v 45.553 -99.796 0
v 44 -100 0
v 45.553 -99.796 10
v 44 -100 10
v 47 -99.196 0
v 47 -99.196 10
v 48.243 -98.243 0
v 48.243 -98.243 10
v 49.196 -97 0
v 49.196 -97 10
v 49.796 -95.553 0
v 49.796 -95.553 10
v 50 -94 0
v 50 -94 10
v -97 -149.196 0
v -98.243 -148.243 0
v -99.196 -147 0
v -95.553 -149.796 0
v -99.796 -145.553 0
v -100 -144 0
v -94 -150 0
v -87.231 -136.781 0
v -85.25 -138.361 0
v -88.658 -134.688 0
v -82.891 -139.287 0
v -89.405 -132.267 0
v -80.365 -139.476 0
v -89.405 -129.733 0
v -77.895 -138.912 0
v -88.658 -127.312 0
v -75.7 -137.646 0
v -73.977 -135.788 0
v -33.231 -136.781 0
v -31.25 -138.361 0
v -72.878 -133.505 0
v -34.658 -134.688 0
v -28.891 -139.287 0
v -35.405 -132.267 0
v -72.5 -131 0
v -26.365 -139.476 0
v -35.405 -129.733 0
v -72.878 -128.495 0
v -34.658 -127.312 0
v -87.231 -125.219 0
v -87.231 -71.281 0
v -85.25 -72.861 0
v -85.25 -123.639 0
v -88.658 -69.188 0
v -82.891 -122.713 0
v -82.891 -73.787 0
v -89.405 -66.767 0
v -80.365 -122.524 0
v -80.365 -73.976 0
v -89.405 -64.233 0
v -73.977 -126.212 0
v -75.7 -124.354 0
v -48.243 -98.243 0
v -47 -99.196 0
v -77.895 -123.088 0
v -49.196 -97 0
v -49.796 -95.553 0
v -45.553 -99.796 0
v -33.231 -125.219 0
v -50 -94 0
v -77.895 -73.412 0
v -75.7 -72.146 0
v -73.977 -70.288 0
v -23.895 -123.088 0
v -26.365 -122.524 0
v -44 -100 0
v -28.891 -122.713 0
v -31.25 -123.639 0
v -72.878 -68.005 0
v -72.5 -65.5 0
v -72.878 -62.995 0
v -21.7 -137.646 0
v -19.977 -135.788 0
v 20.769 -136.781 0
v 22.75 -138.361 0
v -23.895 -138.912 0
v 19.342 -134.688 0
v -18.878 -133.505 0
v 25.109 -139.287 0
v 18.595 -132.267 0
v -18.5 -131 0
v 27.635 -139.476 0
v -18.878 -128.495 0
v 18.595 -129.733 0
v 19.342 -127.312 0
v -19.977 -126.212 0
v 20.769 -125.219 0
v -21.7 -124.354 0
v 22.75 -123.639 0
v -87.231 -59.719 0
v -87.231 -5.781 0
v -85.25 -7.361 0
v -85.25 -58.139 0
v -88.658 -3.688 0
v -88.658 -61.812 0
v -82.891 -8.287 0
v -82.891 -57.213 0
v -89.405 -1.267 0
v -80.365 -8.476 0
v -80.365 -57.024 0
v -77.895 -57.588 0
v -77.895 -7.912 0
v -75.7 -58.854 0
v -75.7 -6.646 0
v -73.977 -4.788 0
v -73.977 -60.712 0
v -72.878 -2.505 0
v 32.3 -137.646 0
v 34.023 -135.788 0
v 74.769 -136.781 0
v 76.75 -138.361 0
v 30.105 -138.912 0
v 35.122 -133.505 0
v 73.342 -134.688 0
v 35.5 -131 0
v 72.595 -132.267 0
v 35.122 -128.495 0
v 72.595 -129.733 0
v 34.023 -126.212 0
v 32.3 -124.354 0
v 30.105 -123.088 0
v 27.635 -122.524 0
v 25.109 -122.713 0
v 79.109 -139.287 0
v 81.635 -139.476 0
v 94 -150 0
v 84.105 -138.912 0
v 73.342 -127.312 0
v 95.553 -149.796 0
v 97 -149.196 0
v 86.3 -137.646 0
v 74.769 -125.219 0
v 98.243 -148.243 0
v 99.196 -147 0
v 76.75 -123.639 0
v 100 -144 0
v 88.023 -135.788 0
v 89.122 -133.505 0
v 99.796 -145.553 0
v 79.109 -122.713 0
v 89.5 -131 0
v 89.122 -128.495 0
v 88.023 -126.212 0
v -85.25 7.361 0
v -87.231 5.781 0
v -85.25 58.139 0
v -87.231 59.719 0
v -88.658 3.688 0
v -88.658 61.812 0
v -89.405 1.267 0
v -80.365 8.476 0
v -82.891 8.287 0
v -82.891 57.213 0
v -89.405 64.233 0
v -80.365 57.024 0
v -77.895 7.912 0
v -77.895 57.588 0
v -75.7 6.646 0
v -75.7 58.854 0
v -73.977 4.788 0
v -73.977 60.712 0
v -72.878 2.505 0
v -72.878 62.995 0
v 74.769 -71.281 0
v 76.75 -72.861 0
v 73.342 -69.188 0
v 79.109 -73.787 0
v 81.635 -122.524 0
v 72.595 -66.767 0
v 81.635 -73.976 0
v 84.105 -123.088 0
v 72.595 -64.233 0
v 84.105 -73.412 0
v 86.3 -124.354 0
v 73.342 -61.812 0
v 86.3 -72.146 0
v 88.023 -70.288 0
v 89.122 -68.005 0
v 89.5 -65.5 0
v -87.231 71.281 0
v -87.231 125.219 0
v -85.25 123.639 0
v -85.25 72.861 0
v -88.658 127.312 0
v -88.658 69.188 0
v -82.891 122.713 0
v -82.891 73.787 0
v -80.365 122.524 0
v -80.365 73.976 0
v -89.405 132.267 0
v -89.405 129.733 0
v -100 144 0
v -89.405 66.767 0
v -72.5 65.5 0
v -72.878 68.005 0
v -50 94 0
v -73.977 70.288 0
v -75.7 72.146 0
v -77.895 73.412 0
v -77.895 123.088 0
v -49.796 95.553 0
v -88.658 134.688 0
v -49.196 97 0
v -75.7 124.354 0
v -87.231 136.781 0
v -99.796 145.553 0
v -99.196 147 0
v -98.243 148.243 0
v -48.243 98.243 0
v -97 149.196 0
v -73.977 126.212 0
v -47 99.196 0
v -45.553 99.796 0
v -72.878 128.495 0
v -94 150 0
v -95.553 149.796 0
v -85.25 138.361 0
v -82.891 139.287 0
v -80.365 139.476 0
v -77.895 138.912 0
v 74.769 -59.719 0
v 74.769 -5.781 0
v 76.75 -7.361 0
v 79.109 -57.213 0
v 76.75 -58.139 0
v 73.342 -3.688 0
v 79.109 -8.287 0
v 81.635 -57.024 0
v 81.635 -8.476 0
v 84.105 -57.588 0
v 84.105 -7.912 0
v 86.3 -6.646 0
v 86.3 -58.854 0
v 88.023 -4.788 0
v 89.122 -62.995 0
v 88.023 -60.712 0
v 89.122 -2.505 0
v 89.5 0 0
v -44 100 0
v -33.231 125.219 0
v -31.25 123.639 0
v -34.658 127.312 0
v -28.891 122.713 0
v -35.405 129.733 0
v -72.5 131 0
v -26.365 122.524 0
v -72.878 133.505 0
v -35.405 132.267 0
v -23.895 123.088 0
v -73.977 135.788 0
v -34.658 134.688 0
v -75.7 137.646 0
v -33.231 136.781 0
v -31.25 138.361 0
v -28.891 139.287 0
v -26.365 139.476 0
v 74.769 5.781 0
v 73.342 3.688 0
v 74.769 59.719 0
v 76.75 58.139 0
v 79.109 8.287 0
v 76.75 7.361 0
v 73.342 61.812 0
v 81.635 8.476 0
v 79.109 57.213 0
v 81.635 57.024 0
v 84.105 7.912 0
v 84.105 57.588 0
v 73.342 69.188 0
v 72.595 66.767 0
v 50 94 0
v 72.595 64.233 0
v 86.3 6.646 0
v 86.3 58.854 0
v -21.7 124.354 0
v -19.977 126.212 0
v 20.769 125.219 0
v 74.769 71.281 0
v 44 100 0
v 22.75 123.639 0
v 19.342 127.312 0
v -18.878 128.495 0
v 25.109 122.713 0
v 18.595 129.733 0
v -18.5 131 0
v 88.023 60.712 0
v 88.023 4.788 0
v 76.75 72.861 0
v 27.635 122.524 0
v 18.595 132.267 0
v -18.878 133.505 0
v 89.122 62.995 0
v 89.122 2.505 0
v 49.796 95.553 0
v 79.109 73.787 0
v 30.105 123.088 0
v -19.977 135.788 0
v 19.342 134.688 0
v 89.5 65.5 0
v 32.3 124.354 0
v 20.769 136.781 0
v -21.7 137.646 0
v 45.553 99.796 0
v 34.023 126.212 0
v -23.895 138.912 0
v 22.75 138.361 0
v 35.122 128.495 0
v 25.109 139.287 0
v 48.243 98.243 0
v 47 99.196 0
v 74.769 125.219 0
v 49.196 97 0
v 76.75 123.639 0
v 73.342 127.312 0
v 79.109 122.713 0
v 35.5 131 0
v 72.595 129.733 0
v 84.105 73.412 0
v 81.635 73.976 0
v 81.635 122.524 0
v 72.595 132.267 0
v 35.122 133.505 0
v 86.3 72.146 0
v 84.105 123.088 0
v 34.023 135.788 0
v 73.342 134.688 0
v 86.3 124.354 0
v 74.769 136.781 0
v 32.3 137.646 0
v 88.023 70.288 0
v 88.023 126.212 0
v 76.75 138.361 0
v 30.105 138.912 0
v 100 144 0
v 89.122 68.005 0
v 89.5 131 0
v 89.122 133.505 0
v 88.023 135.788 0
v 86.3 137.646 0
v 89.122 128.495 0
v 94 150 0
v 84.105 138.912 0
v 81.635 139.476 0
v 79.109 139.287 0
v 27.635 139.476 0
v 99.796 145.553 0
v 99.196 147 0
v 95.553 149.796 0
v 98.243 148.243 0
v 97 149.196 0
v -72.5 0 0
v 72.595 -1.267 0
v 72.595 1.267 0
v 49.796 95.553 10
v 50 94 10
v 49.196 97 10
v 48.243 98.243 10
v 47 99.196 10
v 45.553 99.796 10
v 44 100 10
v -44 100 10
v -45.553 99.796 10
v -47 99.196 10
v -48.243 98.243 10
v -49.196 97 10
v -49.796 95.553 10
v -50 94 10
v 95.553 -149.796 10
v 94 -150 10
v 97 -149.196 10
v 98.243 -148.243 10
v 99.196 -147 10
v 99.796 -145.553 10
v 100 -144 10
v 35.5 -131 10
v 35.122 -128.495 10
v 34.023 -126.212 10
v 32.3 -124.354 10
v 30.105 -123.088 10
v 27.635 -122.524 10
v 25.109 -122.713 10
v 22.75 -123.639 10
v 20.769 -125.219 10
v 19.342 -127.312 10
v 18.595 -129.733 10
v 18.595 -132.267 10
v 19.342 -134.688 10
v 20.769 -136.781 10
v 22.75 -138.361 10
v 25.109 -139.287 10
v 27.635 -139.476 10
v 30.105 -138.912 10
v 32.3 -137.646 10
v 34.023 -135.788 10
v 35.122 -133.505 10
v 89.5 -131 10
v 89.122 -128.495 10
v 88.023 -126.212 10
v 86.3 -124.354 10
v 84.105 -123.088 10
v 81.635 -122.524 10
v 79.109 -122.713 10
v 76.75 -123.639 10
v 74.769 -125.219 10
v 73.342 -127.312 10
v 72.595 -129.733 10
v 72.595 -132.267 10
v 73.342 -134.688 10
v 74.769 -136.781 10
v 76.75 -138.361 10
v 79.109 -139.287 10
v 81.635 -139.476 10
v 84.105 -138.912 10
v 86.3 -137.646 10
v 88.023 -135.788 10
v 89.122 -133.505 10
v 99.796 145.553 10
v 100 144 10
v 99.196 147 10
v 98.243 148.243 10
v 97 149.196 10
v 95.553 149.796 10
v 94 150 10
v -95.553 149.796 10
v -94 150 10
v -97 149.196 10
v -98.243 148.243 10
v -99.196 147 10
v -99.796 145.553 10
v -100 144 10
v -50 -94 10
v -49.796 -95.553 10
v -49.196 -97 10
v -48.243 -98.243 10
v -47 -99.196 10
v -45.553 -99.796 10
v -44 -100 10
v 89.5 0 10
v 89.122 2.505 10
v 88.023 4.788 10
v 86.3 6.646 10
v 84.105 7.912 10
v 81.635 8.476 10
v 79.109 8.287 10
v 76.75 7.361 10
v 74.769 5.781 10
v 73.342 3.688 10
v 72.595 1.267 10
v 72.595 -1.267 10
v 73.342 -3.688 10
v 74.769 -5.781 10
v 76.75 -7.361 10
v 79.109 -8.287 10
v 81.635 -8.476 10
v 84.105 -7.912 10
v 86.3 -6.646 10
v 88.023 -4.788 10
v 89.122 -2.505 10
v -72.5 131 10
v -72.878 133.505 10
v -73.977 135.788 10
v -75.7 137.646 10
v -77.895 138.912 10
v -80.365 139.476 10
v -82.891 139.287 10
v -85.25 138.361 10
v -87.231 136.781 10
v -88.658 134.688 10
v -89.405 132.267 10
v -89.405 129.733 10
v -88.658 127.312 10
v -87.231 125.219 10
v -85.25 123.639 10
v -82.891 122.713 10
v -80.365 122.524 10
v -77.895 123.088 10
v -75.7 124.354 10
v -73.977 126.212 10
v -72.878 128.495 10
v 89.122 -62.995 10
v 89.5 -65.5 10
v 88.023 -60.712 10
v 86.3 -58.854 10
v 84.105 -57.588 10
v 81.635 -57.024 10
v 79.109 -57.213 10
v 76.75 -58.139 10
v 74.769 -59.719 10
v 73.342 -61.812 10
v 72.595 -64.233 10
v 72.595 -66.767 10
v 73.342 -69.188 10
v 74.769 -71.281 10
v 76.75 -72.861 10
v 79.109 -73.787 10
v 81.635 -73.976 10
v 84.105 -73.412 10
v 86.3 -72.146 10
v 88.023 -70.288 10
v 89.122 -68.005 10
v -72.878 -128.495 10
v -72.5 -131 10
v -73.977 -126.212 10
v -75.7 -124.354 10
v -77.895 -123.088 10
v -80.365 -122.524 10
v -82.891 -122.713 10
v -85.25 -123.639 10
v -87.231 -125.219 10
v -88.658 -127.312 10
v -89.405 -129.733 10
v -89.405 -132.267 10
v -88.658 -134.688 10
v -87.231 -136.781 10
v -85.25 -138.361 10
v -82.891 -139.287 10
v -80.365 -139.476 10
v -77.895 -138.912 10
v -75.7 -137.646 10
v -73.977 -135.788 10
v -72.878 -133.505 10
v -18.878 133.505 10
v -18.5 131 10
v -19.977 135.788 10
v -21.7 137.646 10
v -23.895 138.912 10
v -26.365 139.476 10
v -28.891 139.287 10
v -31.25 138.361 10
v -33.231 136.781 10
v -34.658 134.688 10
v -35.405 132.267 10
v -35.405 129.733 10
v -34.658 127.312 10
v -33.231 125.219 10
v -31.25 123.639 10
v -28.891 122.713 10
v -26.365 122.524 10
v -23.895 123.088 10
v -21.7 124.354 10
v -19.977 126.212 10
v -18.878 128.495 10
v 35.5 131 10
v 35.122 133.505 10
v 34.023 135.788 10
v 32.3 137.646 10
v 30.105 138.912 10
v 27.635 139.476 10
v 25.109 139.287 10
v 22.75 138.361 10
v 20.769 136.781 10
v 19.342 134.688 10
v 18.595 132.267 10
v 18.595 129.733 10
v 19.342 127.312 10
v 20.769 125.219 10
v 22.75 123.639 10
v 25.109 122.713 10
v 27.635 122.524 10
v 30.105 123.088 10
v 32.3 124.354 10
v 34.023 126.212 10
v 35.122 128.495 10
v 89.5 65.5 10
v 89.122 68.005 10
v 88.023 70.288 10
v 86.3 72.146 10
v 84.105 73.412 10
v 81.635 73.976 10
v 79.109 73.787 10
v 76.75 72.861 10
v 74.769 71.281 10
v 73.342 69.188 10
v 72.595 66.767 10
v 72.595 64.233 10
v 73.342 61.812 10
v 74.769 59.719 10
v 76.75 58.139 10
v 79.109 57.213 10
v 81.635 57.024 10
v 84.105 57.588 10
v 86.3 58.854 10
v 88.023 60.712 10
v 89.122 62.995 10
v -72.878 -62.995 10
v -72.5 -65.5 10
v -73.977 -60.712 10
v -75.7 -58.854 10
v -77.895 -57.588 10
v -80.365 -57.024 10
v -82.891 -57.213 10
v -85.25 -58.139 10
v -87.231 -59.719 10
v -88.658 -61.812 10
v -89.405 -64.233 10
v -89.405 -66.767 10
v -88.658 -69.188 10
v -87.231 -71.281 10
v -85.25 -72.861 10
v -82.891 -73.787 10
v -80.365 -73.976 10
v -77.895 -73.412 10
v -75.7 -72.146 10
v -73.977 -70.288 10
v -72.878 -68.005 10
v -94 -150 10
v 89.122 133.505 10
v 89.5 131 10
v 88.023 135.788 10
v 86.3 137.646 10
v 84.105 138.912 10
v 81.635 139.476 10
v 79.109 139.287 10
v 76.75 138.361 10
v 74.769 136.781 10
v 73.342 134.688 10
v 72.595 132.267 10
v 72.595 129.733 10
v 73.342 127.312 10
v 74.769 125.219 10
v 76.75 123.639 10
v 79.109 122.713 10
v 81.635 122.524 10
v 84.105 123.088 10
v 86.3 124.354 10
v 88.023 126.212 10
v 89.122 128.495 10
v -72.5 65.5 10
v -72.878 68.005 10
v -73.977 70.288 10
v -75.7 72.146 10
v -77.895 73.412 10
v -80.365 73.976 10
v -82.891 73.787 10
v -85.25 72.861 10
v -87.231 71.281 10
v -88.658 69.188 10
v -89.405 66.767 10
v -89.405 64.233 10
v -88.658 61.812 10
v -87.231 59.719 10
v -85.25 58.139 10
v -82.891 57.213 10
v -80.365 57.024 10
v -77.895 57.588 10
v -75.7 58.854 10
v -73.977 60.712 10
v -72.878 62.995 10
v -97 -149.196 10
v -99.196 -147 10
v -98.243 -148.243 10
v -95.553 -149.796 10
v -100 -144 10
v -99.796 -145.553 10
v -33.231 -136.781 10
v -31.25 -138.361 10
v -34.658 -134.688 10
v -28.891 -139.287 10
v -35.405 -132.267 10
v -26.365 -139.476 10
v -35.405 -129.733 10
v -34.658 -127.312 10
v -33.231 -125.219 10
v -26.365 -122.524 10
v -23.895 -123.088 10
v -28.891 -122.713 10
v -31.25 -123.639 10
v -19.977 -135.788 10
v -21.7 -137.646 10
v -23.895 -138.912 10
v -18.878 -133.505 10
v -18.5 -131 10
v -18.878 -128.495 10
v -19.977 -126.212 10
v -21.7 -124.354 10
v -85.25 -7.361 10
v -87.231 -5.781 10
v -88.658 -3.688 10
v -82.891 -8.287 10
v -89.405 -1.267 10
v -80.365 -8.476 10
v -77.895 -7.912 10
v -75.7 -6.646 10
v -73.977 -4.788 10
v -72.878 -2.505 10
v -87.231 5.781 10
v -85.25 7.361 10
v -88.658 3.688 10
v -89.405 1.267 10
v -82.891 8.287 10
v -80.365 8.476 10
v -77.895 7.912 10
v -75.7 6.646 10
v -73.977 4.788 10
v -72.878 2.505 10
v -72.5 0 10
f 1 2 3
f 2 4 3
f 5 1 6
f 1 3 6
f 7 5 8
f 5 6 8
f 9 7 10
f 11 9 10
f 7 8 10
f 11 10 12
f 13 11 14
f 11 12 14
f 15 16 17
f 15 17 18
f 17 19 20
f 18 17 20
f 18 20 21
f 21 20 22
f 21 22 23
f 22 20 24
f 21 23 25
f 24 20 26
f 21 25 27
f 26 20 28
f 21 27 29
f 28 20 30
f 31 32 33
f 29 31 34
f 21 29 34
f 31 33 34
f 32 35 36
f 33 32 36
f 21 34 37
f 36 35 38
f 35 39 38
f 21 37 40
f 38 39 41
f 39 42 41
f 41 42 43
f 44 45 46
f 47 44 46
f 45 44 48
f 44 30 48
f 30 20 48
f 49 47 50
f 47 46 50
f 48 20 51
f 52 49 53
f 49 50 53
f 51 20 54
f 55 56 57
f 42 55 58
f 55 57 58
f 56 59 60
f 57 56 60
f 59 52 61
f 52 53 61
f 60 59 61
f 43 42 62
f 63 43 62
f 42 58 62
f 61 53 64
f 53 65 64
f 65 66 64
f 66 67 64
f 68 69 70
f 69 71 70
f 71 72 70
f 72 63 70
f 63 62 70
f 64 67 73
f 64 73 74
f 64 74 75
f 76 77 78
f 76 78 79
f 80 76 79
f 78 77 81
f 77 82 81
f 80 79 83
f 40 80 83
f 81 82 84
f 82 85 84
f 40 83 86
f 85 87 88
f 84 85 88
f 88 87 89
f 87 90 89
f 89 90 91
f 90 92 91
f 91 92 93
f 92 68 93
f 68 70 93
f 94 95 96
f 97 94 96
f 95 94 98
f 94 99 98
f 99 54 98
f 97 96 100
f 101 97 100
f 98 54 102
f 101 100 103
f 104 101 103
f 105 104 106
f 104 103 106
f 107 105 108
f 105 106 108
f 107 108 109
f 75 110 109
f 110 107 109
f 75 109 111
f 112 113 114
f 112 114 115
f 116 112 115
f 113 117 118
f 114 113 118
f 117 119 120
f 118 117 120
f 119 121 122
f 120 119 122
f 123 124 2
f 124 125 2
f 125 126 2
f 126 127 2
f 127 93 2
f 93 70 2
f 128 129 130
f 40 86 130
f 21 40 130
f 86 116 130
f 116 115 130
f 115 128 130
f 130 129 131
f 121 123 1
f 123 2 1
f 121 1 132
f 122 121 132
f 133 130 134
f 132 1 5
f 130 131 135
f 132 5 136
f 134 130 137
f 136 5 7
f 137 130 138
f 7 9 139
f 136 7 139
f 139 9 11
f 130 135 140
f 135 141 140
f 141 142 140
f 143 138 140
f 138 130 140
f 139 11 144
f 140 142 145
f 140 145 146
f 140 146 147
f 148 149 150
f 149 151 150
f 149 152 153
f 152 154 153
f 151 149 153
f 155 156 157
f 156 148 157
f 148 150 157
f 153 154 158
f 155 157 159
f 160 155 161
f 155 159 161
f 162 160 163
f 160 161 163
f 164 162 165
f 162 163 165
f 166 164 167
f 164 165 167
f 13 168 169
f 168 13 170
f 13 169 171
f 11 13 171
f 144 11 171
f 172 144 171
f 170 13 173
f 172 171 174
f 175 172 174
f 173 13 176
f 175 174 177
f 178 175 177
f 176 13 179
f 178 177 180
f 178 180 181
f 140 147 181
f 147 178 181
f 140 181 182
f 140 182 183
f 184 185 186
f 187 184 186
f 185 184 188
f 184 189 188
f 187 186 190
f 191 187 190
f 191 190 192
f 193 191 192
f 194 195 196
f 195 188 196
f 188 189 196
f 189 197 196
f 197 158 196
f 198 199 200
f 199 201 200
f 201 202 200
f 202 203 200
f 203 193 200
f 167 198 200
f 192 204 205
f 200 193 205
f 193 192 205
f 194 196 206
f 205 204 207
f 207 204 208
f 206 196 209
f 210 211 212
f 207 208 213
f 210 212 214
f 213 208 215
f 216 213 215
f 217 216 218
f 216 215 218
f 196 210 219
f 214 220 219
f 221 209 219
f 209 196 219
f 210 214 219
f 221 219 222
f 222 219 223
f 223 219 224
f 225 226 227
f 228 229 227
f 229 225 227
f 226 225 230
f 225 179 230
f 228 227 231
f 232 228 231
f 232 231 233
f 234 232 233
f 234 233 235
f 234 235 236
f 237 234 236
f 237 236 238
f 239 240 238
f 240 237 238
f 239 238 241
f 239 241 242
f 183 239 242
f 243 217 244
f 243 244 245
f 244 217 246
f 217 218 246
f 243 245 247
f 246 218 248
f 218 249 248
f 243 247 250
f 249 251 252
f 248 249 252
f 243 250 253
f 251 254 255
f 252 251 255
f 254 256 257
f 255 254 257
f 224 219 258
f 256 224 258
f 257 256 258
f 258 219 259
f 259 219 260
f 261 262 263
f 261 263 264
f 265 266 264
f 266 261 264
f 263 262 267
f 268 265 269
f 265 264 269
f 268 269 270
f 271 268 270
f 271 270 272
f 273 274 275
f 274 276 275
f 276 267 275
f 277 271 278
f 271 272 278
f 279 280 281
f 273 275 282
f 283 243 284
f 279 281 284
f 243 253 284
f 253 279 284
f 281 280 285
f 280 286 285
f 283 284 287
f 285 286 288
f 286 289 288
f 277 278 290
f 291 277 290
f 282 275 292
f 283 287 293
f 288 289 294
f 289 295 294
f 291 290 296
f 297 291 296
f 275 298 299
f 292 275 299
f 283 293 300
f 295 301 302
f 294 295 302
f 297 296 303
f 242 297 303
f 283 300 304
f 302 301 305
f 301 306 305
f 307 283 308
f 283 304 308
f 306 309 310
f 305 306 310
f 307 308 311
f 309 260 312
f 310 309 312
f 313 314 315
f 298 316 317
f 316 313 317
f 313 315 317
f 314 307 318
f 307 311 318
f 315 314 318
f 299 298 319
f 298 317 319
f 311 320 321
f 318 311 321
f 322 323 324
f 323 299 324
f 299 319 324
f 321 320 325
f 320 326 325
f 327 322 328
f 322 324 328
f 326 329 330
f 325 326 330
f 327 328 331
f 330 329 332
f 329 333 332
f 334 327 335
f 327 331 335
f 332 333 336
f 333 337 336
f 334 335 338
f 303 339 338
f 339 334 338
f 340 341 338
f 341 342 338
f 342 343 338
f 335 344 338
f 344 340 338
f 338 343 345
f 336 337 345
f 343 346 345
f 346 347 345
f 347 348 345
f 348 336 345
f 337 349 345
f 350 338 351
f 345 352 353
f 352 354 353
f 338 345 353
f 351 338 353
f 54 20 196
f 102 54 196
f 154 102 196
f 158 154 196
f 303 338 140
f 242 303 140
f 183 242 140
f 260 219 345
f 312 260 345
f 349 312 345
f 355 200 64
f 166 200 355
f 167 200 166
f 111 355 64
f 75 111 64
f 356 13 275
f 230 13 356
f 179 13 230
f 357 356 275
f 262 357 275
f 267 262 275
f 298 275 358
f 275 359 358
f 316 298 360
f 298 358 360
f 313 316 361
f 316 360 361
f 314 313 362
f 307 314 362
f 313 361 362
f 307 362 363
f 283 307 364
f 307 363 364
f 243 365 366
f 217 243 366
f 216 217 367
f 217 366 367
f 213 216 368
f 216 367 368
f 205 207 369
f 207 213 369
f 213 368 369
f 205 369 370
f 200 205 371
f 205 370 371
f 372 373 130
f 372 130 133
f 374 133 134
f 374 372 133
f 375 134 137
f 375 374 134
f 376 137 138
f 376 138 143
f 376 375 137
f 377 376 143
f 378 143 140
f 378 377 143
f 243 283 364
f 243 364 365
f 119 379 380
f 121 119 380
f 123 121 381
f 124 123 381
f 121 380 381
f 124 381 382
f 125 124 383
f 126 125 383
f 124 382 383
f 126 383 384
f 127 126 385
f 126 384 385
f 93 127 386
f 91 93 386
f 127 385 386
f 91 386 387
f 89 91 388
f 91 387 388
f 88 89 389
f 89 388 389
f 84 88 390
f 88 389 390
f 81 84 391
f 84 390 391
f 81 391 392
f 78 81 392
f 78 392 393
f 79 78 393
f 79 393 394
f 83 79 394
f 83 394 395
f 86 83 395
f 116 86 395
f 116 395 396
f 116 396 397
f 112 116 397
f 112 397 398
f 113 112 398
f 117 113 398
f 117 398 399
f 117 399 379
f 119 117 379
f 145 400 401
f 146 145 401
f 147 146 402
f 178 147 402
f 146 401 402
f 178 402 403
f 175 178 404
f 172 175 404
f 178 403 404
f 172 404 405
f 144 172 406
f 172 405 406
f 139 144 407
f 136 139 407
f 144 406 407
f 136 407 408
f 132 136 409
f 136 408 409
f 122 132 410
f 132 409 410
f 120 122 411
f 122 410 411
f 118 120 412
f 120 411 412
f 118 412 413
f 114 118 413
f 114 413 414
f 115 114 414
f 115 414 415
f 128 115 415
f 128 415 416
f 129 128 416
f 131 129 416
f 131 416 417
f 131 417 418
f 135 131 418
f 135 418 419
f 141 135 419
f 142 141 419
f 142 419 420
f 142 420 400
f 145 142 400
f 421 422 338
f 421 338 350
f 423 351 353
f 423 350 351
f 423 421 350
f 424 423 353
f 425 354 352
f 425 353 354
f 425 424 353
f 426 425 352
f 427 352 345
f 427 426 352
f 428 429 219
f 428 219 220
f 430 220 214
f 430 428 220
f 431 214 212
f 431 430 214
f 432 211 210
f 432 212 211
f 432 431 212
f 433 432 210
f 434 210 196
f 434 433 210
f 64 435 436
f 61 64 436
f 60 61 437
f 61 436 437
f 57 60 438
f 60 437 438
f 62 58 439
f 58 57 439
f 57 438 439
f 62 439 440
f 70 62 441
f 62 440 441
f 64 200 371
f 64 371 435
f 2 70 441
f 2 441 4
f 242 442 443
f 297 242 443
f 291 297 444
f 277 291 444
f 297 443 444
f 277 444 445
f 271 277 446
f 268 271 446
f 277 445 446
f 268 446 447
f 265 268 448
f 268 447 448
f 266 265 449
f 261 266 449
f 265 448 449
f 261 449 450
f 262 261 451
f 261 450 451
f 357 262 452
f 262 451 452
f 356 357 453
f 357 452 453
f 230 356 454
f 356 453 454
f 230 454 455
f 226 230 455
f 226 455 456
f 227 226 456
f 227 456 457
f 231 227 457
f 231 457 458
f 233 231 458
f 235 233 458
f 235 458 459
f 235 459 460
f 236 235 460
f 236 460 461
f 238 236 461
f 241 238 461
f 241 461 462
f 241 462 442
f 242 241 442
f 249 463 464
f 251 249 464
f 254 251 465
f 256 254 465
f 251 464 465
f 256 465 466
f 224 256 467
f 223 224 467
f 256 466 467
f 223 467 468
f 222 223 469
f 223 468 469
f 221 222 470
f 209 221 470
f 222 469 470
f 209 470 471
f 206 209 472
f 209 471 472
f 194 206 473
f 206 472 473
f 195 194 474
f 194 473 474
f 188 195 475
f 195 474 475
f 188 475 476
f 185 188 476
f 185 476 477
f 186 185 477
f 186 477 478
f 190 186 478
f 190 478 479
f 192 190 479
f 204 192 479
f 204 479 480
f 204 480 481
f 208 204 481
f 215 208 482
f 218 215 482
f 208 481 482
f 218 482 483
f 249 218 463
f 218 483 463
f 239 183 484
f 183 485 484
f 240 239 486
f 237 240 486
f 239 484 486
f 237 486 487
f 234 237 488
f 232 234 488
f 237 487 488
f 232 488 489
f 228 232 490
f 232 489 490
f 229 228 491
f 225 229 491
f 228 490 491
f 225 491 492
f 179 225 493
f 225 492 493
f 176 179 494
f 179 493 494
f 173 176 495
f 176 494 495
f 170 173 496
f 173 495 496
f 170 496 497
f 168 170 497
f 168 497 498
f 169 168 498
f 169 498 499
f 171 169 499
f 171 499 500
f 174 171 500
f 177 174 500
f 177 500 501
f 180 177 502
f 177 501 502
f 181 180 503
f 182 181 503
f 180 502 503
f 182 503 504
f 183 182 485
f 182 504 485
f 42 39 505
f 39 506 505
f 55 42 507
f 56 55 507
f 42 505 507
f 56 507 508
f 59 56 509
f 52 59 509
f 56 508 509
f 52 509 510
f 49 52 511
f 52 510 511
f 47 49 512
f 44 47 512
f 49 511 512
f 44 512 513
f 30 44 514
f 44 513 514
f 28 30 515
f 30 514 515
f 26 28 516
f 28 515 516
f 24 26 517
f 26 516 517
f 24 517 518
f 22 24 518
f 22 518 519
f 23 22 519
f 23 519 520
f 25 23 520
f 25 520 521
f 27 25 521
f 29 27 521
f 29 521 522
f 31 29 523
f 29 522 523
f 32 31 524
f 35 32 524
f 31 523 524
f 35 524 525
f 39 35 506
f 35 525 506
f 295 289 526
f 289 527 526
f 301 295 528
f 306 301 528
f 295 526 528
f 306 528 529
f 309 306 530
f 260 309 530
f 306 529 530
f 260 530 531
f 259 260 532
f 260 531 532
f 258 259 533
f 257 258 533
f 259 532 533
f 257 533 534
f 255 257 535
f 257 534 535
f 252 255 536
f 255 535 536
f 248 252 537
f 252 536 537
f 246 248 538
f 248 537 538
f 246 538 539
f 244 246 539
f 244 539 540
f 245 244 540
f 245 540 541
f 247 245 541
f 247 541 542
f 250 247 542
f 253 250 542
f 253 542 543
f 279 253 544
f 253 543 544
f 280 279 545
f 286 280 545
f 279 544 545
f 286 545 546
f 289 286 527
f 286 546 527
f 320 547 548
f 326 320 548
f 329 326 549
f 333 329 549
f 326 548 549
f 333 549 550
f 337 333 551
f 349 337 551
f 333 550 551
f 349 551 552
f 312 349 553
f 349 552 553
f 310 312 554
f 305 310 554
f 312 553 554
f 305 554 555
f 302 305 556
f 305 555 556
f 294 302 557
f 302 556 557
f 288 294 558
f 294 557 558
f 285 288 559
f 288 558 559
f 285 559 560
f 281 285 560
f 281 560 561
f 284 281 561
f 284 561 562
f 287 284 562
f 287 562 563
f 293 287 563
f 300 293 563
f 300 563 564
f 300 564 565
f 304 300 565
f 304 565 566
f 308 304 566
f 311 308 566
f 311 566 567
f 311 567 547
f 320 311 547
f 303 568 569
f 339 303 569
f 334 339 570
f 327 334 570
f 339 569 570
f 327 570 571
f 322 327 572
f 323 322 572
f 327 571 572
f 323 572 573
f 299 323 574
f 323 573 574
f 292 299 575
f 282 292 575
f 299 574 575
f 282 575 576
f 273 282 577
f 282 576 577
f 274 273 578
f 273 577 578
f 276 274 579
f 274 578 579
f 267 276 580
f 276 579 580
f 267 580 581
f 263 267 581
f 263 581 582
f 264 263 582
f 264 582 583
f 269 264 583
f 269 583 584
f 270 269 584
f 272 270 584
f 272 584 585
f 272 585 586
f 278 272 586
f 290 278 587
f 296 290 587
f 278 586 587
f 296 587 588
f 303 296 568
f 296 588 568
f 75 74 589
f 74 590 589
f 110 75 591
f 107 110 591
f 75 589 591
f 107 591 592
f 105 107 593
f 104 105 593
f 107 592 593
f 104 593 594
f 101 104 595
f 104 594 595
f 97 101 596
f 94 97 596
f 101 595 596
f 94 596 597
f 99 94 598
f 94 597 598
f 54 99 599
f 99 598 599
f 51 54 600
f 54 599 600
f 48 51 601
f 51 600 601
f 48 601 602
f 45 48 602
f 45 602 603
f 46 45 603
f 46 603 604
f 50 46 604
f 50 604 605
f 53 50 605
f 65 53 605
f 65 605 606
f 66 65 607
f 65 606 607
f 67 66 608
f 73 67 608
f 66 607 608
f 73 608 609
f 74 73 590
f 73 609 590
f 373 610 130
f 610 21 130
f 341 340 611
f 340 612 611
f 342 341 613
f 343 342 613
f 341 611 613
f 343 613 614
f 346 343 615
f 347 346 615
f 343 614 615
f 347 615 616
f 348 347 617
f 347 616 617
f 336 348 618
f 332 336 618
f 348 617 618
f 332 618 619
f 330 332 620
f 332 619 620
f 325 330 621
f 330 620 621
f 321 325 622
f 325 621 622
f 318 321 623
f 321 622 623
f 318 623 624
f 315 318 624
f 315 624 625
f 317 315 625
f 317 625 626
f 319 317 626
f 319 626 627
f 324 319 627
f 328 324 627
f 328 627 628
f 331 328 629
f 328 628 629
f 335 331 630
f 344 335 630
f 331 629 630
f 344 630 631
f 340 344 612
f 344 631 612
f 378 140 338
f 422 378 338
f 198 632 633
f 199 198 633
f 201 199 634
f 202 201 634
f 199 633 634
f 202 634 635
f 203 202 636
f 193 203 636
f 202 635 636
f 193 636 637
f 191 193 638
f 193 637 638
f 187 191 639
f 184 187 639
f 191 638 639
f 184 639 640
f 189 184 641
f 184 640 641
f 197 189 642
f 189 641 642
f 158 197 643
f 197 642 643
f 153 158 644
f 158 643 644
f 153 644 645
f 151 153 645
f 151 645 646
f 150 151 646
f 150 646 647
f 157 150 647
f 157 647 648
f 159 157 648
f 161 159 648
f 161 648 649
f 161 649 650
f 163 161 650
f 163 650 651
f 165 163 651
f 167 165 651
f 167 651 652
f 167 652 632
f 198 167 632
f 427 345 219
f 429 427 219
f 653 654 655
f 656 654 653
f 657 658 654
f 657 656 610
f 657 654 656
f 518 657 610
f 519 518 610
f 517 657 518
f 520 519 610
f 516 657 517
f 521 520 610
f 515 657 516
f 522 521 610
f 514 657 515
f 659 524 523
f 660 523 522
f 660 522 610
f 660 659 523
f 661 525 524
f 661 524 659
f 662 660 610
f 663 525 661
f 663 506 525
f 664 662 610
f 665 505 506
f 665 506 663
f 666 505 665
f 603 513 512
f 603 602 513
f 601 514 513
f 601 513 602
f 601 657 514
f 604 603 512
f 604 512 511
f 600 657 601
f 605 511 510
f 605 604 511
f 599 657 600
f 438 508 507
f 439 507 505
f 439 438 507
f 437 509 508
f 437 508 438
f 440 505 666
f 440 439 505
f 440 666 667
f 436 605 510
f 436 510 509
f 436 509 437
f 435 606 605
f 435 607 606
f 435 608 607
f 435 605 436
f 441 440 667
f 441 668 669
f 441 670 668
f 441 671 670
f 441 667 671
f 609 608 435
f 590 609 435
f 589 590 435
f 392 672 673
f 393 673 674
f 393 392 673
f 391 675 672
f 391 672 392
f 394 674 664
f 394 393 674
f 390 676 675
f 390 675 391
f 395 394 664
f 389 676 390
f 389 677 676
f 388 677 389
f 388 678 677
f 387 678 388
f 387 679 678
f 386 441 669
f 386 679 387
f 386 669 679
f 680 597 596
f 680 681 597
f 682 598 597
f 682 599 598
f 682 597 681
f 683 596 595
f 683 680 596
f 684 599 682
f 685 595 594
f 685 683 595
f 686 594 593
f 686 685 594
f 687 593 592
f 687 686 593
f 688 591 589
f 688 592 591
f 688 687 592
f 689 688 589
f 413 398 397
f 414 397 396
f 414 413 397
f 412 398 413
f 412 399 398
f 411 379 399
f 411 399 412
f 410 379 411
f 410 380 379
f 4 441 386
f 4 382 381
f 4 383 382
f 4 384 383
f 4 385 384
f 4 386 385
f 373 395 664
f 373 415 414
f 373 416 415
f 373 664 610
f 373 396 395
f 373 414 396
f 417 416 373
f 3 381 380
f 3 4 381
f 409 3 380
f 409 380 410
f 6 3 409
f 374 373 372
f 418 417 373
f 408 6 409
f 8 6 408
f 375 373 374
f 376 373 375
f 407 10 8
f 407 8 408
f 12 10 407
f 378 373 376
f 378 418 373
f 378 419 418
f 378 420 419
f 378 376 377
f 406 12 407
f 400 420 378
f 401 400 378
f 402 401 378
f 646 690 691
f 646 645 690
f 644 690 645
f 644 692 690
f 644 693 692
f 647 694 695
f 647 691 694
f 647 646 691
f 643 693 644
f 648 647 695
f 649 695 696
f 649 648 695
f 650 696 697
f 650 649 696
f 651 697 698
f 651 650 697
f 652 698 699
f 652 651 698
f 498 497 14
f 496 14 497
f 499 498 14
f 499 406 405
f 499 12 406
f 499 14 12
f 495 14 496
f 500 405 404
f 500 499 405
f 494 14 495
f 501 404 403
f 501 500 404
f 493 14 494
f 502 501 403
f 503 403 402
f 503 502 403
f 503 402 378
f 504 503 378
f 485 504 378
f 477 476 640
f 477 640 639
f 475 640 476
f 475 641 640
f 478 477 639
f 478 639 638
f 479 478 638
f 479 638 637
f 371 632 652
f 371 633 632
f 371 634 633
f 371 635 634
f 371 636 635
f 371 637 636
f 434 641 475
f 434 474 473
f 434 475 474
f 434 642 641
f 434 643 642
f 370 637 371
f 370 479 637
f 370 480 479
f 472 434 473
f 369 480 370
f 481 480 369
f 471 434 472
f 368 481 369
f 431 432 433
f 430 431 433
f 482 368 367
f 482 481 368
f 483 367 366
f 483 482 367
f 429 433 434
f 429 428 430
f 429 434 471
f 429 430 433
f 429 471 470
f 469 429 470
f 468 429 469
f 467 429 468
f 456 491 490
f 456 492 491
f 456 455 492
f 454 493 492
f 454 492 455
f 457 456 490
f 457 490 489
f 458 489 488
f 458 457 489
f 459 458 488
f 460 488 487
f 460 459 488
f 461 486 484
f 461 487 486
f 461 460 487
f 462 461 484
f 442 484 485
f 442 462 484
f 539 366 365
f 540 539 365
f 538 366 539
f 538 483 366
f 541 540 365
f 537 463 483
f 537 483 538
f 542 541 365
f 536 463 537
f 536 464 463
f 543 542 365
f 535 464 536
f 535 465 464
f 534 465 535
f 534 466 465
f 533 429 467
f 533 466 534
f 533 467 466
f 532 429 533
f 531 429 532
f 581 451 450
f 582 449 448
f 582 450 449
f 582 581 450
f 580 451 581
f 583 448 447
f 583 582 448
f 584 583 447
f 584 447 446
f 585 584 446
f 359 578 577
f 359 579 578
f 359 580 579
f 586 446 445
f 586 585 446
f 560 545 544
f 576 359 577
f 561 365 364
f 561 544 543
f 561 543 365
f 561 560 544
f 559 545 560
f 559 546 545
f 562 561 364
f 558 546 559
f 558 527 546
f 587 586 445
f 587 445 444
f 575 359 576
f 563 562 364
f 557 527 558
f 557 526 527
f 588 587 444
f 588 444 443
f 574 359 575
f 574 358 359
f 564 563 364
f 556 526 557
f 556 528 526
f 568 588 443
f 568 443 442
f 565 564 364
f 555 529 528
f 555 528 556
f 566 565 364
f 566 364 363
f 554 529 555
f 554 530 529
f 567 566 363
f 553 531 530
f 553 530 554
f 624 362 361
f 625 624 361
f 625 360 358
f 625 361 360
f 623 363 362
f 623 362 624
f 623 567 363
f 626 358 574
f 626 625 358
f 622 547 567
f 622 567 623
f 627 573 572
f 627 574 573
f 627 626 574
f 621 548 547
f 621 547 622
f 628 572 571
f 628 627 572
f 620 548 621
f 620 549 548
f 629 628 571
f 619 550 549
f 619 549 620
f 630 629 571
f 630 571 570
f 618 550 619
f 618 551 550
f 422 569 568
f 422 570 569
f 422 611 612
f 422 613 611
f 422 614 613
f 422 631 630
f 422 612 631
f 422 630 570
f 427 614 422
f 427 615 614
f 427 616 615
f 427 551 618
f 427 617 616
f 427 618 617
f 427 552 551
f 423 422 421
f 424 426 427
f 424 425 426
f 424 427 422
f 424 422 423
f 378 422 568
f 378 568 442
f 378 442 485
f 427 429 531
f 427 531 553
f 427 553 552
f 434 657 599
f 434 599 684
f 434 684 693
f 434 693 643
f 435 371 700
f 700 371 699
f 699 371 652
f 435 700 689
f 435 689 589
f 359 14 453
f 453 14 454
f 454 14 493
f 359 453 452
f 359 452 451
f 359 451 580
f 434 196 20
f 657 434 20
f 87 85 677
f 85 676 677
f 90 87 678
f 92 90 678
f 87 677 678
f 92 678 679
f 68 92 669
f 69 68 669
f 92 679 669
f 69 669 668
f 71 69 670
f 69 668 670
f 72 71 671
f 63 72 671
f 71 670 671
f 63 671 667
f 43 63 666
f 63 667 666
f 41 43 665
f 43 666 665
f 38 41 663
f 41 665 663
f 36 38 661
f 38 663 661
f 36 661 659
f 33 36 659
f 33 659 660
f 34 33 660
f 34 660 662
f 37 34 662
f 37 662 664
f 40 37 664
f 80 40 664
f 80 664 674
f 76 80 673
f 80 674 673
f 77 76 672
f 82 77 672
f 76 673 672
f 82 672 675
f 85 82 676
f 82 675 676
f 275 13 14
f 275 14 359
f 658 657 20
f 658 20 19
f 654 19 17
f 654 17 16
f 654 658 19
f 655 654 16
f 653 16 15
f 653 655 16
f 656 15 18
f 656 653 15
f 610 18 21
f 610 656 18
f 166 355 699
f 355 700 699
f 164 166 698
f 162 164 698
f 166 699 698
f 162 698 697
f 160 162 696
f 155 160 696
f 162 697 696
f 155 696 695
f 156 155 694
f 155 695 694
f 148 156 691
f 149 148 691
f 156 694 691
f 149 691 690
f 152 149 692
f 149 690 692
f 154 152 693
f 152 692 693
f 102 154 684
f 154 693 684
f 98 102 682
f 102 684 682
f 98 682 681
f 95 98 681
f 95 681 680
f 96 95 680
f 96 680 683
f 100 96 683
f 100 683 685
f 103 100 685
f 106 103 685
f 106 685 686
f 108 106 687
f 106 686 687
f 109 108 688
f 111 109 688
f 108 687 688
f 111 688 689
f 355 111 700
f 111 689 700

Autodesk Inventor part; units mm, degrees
ref_plane "YZ Plane" through (0, 0, 0) normal (1, 0, 0) x (0, 1, 0)
ref_plane "XZ Plane" through (0, 0, 0) normal (0, 1, 0) x (-1, 0, 0)
ref_plane "XY Plane" through (0, 0, 0) normal (0, 0, 1) x (1, 0, 0)
sketch "Sketch2" plane through (0, 0, 0) normal (0, 0, 1) x (1, 0, 0)
  line L0 (-50, -100) -> (50, -100)
  line L1 (50, -100) -> (50, 100)
  line L2 (50, 100) -> (-50, 100)
  line L3 (-50, 100) -> (-50, -100)
  line L4 (-50, -100) -> (50, 100) construction
  line L5 (50, -100) -> (-50, 100) construction
  line L6 (-100, -150) -> (100, -150)
  line L7 (100, -150) -> (100, 150)
  line L8 (100, 150) -> (-100, 150)
  line L9 (-100, 150) -> (-100, -150)
  point P0 (0, 0)
  dimension "d29" = 100
  dimension "d30" = 200
  dimension "d31" = 50
extrude "Plate2" add sketch "Sketch2" along normal blind 10
sketch "Sketch5" plane through (0, 0, 10) normal (0, 0, 1) x (1, 0, 0)
  line L0 (50, 100) -> (50, -100) construction
  line L1 (50, -100) -> (-50, -100) construction
  line L2 (-50, -100) -> (-50, 100) construction
  line L3 (-50, 100) -> (50, 100) construction
  line L4 (100, -150) -> (-100, -150) construction
  line L5 (100, 150) -> (100, -150) construction
  line L6 (-100, 150) -> (100, 150) construction
  line L7 (-100, -150) -> (-100, 150) construction
  line L8 (-81, 131) -> (81, 131) construction
  line L9 (81, 131) -> (81, -131) construction
  line L10 (81, -131) -> (-81, -131) construction
  line L11 (-81, -131) -> (-81, 131) construction
  circle A0 centre (-81, -131) radius 8.5
  circle A1 centre (-81, 131) radius 8.5
  circle A2 centre (-81, 0) radius 8.5
  circle A3 centre (-81, -65.5) radius 8.5
  circle A4 centre (-81, 65.5) radius 8.5
  line L12 (-50, 0) -> (50, 0) construction
  circle A5 centre (-27, -131) radius 8.5
  circle A6 centre (-27, -65.5) radius 8.5
  circle A7 centre (-27, 0) radius 8.5
  circle A8 centre (-27, 65.5) radius 8.5
  circle A9 centre (-27, 131) radius 8.5
  circle A10 centre (27, -131) radius 8.5
  circle A11 centre (27, -65.5) radius 8.5
  circle A12 centre (27, 0) radius 8.5
  circle A13 centre (27, 65.5) radius 8.5
  circle A14 centre (27, 131) radius 8.5
  circle A15 centre (81, -131) radius 8.5
  circle A16 centre (81, -65.5) radius 8.5
  circle A17 centre (81, 0) radius 8.5
  circle A18 centre (81, 65.5) radius 8.5
  circle A19 centre (81, 131) radius 8.5
  point P0 (0, 0)
  point P1 (0, -131)
  dimension "d33" = 17
  dimension "d34" = 19
  dimension "d35" = 65.5
  dimension "d36" = 65.5
  dimension "d39" = 54
extrude "Cut3" cut sketch "Sketch5" against normal blind 10
fillet "Corner Round1" radius 6 8 edges at (-100, -150, 5) (-100, 150, 5) (100, 150, 5) (100, -150, 5) (50, -100, 5) (-50, -100, 5) (-50, 100, 5) (50, 100, 5)
equation "\"d35\" = d36"
equation "\"d44\" = Thickness"
equation "\"d14\" = Thickness"
equation "\"BendReliefDepth\" = 0.5 * Thickness"
equation "\"TransitionRadius\" = BendRadius"
equation "\"JacobiRadiusSize\" = BendRadius"
equation "\"Thickness\" = 10"
equation "\"BendRadius\" = 6"
properties part number "PRS 9606 charging flange round_1200" material "Steel"
